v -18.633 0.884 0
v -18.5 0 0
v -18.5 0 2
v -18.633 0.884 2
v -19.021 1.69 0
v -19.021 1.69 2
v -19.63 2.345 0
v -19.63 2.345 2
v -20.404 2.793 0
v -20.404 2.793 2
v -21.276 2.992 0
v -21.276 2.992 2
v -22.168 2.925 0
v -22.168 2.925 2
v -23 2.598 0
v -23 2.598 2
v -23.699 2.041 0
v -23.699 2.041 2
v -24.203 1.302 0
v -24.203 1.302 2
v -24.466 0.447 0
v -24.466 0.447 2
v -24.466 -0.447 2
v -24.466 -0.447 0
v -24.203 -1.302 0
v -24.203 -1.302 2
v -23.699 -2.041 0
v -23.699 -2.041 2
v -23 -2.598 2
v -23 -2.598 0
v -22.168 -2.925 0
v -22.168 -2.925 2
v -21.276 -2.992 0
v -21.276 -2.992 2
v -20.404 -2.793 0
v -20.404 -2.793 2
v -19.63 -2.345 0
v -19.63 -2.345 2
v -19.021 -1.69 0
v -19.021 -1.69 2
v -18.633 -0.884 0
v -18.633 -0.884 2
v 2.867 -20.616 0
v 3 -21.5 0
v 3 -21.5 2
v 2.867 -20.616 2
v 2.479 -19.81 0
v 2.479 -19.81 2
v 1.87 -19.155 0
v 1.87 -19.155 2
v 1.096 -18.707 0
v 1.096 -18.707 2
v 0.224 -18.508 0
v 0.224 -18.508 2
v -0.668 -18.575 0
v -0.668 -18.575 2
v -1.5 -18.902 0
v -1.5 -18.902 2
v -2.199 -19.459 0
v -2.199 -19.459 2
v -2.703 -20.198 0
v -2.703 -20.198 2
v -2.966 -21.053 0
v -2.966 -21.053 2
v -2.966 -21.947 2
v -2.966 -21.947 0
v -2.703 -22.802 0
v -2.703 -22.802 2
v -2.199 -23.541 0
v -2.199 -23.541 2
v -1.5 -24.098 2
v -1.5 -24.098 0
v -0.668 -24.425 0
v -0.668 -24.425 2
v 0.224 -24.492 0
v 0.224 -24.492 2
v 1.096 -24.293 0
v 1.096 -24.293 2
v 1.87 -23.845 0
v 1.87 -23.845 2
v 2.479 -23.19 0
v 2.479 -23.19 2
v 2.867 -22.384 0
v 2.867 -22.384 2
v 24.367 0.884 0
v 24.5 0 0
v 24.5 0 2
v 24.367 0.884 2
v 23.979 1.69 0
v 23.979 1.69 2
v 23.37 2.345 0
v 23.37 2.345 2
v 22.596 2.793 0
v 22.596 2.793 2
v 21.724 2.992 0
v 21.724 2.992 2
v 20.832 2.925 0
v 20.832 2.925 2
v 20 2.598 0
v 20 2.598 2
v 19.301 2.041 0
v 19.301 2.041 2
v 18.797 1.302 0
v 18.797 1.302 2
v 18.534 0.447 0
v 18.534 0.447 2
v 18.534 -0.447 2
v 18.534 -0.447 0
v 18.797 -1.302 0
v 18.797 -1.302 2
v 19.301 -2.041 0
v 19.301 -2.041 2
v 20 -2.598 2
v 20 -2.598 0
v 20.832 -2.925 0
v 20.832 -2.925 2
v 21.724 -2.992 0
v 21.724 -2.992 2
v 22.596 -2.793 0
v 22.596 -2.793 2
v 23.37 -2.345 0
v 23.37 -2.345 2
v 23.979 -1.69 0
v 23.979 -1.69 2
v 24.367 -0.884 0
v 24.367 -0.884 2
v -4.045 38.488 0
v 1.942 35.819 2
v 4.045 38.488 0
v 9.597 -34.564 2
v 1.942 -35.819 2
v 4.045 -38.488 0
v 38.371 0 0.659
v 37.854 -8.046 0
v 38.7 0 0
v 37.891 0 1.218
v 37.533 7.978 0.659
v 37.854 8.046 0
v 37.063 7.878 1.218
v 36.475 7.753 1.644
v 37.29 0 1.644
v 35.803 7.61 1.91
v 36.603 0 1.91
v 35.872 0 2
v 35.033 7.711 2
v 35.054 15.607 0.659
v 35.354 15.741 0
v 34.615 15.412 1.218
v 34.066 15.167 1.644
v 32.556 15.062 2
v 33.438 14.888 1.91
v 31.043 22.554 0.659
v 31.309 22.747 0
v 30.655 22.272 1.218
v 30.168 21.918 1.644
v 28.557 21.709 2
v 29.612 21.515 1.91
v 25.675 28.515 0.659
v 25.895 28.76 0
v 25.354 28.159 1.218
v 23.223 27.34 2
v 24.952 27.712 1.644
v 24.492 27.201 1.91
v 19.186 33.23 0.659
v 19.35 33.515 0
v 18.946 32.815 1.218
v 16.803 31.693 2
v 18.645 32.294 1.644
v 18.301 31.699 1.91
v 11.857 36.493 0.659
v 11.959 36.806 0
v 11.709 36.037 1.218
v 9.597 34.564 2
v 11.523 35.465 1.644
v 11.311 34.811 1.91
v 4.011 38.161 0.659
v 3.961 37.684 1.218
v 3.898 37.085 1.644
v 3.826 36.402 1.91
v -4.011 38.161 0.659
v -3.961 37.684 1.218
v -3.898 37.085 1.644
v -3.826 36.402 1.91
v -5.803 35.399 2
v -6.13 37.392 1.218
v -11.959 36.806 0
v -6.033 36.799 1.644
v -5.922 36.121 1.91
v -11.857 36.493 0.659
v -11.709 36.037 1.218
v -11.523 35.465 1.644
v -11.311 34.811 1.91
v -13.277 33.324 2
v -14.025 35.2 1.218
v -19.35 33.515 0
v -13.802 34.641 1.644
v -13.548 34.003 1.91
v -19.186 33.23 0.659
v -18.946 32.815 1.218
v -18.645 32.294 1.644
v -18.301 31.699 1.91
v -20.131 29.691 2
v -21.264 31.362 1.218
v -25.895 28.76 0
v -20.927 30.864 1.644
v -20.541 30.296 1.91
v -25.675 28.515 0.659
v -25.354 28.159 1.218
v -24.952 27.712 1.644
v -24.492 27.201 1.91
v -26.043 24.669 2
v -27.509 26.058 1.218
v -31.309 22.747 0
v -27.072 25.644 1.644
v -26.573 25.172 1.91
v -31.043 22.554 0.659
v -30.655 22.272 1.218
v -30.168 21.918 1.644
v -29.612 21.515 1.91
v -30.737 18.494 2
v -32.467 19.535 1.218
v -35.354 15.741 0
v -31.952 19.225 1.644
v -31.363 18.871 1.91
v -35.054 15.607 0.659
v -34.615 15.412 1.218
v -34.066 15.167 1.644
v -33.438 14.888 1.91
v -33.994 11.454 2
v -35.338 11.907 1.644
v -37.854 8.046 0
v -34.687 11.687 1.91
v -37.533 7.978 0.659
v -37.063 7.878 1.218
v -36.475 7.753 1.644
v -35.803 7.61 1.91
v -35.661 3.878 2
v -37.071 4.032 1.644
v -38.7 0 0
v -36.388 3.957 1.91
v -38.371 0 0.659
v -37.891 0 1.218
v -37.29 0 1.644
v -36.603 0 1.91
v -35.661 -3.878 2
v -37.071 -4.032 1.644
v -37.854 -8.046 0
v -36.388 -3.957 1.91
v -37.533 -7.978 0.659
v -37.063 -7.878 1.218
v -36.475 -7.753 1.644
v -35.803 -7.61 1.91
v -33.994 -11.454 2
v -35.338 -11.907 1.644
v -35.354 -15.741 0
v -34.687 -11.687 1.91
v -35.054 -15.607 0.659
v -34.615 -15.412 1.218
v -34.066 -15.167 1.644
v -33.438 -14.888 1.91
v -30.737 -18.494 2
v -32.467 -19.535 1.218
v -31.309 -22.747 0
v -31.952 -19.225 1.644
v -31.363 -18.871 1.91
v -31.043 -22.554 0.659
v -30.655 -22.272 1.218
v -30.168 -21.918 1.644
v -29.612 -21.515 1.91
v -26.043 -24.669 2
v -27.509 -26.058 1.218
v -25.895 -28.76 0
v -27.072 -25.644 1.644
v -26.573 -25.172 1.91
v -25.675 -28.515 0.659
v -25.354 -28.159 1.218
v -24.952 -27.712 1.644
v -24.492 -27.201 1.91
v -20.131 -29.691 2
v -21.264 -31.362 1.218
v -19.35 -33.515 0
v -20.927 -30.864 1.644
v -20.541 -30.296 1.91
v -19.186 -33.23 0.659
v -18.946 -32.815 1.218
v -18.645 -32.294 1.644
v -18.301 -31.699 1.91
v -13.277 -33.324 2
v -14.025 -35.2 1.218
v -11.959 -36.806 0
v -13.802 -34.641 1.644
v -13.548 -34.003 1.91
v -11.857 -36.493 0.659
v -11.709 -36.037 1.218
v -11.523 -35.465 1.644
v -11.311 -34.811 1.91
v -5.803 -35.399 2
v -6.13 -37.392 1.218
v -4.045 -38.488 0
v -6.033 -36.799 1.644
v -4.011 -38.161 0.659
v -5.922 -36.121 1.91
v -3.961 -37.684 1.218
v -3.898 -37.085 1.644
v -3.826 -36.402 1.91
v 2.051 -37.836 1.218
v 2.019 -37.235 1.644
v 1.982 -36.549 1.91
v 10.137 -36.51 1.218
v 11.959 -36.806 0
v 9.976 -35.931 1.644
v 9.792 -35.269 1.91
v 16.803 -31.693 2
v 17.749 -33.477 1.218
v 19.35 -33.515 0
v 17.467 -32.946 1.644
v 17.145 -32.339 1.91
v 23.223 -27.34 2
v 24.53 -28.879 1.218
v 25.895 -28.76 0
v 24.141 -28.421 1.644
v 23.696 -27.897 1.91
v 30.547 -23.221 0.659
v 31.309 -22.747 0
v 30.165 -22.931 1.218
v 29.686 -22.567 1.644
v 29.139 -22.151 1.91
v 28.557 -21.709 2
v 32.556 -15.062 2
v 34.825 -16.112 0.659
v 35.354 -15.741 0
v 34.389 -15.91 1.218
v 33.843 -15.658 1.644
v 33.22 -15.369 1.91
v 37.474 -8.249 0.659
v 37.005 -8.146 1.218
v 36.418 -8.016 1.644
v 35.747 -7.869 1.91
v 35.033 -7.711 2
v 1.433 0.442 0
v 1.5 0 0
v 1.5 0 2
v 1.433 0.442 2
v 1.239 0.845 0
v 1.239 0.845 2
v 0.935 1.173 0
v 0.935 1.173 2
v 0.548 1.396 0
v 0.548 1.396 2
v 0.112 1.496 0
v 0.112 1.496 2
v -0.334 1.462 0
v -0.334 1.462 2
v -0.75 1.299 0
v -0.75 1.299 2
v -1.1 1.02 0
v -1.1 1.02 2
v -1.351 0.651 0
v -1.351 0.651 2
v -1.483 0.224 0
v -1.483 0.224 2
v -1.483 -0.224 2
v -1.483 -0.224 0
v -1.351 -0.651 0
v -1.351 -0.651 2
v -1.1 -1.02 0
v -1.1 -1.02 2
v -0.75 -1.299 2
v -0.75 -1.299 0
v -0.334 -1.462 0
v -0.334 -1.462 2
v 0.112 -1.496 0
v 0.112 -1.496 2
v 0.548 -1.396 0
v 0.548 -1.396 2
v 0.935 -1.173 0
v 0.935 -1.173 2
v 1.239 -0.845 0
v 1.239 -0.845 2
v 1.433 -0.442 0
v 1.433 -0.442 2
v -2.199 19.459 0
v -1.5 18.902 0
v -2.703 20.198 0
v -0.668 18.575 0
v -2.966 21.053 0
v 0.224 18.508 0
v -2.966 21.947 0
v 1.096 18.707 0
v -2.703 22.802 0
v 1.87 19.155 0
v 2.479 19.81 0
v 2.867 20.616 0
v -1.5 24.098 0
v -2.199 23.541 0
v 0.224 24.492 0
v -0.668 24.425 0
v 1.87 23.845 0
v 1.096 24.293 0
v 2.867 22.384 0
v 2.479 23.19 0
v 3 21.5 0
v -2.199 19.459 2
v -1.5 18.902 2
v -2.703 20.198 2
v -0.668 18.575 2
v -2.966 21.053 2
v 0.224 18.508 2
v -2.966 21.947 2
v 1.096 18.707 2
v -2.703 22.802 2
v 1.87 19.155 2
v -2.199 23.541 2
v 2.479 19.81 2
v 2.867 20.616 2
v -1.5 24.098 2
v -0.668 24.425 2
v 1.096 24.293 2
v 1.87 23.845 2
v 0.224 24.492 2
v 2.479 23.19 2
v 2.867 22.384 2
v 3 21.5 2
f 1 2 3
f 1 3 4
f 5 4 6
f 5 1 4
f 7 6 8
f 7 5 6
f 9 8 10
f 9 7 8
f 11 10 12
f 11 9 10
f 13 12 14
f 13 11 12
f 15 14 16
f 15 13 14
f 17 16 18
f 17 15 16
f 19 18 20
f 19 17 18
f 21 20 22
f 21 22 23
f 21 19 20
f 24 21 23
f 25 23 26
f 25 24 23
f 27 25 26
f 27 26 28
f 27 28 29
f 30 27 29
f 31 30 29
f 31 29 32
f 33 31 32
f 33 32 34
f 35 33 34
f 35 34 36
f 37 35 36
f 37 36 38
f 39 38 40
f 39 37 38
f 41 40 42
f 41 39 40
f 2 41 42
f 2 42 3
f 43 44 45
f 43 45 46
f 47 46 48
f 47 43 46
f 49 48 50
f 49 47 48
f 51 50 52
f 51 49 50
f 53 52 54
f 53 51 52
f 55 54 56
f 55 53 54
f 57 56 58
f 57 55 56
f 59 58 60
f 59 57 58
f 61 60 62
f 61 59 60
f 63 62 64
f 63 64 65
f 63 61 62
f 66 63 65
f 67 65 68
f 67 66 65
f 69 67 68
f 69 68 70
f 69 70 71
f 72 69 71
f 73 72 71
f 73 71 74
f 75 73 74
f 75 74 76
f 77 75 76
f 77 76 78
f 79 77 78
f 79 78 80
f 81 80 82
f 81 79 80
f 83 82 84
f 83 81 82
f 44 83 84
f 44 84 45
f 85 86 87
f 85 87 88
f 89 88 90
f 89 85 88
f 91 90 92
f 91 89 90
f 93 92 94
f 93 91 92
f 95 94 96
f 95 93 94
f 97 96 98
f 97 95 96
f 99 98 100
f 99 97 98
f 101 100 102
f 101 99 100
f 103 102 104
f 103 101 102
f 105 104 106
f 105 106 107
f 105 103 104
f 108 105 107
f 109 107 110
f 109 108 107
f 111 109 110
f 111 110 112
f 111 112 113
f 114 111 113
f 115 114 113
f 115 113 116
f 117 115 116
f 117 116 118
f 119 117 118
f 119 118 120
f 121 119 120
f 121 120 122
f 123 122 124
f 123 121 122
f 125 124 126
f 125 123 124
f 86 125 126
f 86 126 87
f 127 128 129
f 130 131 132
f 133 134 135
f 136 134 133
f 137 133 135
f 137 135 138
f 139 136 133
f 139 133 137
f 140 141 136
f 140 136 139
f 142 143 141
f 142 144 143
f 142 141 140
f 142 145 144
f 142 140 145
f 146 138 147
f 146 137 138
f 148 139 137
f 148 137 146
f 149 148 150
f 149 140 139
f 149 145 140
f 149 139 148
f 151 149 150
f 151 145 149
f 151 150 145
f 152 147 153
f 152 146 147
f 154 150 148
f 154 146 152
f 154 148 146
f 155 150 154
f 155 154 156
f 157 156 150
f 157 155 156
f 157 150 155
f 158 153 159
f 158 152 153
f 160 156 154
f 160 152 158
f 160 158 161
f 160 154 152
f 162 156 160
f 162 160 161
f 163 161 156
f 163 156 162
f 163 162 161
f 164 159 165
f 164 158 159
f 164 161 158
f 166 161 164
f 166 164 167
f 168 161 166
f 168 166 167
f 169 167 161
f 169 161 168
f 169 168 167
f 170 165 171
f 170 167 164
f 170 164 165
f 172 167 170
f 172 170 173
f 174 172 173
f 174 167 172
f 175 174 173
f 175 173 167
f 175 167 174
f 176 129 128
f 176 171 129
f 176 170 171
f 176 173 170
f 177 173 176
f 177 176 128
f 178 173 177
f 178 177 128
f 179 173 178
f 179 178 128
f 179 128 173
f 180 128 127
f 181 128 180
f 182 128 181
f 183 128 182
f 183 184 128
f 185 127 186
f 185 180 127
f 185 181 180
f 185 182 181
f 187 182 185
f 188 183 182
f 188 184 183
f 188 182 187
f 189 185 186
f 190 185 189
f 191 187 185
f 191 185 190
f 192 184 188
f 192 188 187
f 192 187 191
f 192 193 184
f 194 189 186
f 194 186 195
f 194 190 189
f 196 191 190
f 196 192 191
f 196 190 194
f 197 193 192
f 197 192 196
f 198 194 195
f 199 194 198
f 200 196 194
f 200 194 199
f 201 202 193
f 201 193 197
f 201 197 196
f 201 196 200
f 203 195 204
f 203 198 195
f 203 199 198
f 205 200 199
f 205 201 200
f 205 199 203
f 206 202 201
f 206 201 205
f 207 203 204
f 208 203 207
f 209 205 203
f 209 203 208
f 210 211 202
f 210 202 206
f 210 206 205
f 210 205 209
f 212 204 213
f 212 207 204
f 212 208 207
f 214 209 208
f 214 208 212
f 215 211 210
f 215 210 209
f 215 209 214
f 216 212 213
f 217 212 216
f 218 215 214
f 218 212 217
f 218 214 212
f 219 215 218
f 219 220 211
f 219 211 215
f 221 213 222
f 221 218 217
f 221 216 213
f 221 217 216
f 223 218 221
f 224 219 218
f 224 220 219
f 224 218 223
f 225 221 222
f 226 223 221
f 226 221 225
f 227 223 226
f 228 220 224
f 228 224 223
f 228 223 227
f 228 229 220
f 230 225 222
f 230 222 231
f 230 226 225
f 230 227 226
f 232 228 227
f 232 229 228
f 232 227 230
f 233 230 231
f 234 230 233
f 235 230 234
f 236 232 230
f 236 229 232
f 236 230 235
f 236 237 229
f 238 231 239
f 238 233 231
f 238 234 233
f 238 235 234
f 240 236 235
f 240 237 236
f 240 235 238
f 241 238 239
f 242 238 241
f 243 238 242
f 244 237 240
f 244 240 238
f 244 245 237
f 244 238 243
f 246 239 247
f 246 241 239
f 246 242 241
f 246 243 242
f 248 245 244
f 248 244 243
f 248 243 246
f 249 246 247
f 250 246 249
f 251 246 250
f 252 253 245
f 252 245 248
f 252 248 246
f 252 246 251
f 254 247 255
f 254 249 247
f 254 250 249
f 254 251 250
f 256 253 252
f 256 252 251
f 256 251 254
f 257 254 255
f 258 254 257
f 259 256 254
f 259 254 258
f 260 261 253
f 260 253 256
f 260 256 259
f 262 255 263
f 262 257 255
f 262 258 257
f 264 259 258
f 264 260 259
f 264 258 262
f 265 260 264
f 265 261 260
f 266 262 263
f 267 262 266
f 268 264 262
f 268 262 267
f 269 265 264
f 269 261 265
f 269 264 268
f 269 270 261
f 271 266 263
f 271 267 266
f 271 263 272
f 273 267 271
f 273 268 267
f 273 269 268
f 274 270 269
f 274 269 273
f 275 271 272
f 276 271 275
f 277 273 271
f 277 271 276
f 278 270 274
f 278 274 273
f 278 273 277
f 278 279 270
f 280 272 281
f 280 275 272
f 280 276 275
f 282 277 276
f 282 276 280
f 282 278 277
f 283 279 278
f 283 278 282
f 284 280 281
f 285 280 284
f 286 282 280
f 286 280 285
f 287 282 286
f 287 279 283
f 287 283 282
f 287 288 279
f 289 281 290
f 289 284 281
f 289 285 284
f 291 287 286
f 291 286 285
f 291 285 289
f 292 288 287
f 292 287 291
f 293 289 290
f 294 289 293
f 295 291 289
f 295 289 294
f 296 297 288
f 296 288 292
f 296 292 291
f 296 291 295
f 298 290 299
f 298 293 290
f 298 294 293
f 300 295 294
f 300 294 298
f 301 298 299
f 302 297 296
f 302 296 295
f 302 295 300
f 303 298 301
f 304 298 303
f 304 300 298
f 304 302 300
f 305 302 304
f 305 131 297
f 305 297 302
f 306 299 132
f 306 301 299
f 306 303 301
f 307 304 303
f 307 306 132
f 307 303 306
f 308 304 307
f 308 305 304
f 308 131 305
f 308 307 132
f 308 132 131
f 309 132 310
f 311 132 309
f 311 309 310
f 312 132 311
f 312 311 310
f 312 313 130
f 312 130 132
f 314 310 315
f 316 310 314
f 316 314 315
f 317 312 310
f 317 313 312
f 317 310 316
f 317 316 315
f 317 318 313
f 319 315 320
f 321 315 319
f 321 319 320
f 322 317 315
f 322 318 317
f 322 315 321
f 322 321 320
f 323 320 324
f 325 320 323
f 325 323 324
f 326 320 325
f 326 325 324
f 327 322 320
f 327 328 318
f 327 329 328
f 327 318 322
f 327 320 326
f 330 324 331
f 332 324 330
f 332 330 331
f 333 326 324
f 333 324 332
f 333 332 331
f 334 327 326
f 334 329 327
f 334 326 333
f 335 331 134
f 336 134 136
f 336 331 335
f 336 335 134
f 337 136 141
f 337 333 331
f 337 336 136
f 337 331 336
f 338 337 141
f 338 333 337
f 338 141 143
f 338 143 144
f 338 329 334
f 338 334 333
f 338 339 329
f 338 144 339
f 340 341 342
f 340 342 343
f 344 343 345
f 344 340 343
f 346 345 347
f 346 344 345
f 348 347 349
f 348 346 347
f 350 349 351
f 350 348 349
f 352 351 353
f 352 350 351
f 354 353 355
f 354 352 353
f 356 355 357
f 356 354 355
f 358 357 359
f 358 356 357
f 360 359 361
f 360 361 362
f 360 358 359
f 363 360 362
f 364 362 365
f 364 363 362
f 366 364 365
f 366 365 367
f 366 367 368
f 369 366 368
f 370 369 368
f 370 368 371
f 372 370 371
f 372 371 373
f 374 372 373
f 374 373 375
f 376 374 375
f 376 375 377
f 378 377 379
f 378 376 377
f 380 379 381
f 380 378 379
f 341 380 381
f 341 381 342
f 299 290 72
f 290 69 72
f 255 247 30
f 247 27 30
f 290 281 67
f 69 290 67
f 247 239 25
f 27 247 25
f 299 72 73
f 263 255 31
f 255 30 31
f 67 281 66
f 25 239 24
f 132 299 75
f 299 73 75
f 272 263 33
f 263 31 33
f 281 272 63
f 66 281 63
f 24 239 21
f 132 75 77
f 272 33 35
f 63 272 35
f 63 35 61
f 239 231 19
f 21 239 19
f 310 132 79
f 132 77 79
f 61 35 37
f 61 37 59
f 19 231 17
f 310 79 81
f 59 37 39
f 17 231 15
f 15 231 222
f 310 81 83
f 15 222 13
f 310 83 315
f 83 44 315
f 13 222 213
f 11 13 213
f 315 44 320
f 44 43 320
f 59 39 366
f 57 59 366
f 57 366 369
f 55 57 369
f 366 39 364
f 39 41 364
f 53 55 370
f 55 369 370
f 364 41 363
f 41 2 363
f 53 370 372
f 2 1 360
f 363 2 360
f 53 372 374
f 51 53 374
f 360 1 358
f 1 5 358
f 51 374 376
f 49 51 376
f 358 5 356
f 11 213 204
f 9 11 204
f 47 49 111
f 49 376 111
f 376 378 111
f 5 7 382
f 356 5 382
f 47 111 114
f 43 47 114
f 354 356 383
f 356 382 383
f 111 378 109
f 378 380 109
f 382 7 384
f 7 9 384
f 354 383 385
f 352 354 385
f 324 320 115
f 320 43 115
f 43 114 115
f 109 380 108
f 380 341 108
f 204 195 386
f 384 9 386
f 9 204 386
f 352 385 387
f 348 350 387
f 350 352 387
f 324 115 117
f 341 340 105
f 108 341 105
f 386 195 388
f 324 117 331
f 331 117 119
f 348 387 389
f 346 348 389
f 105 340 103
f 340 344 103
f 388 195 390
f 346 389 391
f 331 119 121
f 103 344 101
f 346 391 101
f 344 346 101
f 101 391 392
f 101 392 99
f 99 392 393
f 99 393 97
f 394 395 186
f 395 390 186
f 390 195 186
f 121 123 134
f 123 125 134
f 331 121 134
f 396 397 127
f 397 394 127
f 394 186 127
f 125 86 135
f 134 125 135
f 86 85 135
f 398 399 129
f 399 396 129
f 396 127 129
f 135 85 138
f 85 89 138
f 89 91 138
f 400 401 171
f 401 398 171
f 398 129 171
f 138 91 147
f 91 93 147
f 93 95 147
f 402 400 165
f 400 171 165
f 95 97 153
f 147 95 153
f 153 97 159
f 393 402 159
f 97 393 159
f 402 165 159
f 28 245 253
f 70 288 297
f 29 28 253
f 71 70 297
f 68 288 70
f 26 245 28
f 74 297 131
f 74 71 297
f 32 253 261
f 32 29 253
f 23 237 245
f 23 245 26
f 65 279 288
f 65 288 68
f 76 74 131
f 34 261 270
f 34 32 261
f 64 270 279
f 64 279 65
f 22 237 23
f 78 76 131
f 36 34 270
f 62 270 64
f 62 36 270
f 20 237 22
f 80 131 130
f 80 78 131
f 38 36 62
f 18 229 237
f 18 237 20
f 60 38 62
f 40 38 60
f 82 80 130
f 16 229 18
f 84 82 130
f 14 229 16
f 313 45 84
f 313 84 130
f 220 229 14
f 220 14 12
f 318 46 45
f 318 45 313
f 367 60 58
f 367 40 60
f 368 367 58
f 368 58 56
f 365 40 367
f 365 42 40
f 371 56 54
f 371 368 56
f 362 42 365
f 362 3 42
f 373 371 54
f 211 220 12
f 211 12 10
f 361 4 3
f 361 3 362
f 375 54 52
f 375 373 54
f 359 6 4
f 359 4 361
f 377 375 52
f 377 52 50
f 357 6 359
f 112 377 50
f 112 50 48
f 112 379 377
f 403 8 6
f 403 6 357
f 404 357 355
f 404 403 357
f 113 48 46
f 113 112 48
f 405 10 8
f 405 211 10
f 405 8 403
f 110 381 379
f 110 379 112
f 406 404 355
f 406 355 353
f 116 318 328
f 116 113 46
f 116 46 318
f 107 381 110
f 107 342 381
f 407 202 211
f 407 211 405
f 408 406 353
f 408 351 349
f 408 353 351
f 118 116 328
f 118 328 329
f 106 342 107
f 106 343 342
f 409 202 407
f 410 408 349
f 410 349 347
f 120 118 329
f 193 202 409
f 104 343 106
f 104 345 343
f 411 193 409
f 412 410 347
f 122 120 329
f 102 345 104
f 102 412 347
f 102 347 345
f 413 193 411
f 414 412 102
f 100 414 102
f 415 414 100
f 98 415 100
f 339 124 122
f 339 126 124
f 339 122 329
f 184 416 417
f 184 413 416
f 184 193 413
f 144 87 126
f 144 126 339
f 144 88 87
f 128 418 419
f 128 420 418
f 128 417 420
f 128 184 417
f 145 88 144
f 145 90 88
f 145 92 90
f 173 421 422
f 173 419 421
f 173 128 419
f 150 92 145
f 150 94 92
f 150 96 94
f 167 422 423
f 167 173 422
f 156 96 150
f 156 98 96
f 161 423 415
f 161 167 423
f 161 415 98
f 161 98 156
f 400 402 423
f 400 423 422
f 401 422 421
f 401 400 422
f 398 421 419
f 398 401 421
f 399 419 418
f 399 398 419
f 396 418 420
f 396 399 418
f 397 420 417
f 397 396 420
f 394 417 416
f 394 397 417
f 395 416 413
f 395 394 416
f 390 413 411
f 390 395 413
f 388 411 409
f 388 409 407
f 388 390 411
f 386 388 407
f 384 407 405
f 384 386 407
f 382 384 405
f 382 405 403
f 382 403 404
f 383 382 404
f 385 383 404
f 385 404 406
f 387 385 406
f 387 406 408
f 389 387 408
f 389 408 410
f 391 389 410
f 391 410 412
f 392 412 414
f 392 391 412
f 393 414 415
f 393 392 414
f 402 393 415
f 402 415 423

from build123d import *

# Parameters (mm, degrees)
F0_R     = 38.7
F0_R_2   = 3
F0_R_3   = 1.5
F1_DEPTH = 2


# Not quite as in the source:
# - a fillet or chamfer that OpenCascade refuses, or shapes differently, is made with other operations: its cross-section is extruded or revolved along the edge and cut away or added


with BuildPart() as f1:
    # F0 (on Top) → F1 (new body)
    with BuildSketch(Plane.XY):
        Circle(F0_R)
        with Locations((0, -21.5)):
            Circle(F0_R_2, mode=Mode.SUBTRACT)
        with Locations((-21.5, 0)):
            Circle(F0_R_2, mode=Mode.SUBTRACT)
        Circle(F0_R_3, mode=Mode.SUBTRACT)
        with Locations((21.5, 0)):
            Circle(F0_R_2, mode=Mode.SUBTRACT)
        with Locations((0, 21.5)):
            Circle(F0_R_2, mode=Mode.SUBTRACT)
    extrude(amount=F1_DEPTH)

    # F2: fillet of radius 3 on 1 edges, made by hand

    # F2_s1 → F2_t2 (revolve, cut)
    with BuildSketch(Plane.XZ):
        with BuildLine():
            ThreePointArc((38.7, 0), (37.6036236828, 1.4494897428), (35.8715728753, 2))
            Line((35.8715728753, 2), (38.7, 2))
            Line((38.7, 2), (38.7, 0))
        make_face()
    revolve(axis=Axis((0, 0, 2), (0, 0, 1)), mode=Mode.SUBTRACT)


solid = f1.part
